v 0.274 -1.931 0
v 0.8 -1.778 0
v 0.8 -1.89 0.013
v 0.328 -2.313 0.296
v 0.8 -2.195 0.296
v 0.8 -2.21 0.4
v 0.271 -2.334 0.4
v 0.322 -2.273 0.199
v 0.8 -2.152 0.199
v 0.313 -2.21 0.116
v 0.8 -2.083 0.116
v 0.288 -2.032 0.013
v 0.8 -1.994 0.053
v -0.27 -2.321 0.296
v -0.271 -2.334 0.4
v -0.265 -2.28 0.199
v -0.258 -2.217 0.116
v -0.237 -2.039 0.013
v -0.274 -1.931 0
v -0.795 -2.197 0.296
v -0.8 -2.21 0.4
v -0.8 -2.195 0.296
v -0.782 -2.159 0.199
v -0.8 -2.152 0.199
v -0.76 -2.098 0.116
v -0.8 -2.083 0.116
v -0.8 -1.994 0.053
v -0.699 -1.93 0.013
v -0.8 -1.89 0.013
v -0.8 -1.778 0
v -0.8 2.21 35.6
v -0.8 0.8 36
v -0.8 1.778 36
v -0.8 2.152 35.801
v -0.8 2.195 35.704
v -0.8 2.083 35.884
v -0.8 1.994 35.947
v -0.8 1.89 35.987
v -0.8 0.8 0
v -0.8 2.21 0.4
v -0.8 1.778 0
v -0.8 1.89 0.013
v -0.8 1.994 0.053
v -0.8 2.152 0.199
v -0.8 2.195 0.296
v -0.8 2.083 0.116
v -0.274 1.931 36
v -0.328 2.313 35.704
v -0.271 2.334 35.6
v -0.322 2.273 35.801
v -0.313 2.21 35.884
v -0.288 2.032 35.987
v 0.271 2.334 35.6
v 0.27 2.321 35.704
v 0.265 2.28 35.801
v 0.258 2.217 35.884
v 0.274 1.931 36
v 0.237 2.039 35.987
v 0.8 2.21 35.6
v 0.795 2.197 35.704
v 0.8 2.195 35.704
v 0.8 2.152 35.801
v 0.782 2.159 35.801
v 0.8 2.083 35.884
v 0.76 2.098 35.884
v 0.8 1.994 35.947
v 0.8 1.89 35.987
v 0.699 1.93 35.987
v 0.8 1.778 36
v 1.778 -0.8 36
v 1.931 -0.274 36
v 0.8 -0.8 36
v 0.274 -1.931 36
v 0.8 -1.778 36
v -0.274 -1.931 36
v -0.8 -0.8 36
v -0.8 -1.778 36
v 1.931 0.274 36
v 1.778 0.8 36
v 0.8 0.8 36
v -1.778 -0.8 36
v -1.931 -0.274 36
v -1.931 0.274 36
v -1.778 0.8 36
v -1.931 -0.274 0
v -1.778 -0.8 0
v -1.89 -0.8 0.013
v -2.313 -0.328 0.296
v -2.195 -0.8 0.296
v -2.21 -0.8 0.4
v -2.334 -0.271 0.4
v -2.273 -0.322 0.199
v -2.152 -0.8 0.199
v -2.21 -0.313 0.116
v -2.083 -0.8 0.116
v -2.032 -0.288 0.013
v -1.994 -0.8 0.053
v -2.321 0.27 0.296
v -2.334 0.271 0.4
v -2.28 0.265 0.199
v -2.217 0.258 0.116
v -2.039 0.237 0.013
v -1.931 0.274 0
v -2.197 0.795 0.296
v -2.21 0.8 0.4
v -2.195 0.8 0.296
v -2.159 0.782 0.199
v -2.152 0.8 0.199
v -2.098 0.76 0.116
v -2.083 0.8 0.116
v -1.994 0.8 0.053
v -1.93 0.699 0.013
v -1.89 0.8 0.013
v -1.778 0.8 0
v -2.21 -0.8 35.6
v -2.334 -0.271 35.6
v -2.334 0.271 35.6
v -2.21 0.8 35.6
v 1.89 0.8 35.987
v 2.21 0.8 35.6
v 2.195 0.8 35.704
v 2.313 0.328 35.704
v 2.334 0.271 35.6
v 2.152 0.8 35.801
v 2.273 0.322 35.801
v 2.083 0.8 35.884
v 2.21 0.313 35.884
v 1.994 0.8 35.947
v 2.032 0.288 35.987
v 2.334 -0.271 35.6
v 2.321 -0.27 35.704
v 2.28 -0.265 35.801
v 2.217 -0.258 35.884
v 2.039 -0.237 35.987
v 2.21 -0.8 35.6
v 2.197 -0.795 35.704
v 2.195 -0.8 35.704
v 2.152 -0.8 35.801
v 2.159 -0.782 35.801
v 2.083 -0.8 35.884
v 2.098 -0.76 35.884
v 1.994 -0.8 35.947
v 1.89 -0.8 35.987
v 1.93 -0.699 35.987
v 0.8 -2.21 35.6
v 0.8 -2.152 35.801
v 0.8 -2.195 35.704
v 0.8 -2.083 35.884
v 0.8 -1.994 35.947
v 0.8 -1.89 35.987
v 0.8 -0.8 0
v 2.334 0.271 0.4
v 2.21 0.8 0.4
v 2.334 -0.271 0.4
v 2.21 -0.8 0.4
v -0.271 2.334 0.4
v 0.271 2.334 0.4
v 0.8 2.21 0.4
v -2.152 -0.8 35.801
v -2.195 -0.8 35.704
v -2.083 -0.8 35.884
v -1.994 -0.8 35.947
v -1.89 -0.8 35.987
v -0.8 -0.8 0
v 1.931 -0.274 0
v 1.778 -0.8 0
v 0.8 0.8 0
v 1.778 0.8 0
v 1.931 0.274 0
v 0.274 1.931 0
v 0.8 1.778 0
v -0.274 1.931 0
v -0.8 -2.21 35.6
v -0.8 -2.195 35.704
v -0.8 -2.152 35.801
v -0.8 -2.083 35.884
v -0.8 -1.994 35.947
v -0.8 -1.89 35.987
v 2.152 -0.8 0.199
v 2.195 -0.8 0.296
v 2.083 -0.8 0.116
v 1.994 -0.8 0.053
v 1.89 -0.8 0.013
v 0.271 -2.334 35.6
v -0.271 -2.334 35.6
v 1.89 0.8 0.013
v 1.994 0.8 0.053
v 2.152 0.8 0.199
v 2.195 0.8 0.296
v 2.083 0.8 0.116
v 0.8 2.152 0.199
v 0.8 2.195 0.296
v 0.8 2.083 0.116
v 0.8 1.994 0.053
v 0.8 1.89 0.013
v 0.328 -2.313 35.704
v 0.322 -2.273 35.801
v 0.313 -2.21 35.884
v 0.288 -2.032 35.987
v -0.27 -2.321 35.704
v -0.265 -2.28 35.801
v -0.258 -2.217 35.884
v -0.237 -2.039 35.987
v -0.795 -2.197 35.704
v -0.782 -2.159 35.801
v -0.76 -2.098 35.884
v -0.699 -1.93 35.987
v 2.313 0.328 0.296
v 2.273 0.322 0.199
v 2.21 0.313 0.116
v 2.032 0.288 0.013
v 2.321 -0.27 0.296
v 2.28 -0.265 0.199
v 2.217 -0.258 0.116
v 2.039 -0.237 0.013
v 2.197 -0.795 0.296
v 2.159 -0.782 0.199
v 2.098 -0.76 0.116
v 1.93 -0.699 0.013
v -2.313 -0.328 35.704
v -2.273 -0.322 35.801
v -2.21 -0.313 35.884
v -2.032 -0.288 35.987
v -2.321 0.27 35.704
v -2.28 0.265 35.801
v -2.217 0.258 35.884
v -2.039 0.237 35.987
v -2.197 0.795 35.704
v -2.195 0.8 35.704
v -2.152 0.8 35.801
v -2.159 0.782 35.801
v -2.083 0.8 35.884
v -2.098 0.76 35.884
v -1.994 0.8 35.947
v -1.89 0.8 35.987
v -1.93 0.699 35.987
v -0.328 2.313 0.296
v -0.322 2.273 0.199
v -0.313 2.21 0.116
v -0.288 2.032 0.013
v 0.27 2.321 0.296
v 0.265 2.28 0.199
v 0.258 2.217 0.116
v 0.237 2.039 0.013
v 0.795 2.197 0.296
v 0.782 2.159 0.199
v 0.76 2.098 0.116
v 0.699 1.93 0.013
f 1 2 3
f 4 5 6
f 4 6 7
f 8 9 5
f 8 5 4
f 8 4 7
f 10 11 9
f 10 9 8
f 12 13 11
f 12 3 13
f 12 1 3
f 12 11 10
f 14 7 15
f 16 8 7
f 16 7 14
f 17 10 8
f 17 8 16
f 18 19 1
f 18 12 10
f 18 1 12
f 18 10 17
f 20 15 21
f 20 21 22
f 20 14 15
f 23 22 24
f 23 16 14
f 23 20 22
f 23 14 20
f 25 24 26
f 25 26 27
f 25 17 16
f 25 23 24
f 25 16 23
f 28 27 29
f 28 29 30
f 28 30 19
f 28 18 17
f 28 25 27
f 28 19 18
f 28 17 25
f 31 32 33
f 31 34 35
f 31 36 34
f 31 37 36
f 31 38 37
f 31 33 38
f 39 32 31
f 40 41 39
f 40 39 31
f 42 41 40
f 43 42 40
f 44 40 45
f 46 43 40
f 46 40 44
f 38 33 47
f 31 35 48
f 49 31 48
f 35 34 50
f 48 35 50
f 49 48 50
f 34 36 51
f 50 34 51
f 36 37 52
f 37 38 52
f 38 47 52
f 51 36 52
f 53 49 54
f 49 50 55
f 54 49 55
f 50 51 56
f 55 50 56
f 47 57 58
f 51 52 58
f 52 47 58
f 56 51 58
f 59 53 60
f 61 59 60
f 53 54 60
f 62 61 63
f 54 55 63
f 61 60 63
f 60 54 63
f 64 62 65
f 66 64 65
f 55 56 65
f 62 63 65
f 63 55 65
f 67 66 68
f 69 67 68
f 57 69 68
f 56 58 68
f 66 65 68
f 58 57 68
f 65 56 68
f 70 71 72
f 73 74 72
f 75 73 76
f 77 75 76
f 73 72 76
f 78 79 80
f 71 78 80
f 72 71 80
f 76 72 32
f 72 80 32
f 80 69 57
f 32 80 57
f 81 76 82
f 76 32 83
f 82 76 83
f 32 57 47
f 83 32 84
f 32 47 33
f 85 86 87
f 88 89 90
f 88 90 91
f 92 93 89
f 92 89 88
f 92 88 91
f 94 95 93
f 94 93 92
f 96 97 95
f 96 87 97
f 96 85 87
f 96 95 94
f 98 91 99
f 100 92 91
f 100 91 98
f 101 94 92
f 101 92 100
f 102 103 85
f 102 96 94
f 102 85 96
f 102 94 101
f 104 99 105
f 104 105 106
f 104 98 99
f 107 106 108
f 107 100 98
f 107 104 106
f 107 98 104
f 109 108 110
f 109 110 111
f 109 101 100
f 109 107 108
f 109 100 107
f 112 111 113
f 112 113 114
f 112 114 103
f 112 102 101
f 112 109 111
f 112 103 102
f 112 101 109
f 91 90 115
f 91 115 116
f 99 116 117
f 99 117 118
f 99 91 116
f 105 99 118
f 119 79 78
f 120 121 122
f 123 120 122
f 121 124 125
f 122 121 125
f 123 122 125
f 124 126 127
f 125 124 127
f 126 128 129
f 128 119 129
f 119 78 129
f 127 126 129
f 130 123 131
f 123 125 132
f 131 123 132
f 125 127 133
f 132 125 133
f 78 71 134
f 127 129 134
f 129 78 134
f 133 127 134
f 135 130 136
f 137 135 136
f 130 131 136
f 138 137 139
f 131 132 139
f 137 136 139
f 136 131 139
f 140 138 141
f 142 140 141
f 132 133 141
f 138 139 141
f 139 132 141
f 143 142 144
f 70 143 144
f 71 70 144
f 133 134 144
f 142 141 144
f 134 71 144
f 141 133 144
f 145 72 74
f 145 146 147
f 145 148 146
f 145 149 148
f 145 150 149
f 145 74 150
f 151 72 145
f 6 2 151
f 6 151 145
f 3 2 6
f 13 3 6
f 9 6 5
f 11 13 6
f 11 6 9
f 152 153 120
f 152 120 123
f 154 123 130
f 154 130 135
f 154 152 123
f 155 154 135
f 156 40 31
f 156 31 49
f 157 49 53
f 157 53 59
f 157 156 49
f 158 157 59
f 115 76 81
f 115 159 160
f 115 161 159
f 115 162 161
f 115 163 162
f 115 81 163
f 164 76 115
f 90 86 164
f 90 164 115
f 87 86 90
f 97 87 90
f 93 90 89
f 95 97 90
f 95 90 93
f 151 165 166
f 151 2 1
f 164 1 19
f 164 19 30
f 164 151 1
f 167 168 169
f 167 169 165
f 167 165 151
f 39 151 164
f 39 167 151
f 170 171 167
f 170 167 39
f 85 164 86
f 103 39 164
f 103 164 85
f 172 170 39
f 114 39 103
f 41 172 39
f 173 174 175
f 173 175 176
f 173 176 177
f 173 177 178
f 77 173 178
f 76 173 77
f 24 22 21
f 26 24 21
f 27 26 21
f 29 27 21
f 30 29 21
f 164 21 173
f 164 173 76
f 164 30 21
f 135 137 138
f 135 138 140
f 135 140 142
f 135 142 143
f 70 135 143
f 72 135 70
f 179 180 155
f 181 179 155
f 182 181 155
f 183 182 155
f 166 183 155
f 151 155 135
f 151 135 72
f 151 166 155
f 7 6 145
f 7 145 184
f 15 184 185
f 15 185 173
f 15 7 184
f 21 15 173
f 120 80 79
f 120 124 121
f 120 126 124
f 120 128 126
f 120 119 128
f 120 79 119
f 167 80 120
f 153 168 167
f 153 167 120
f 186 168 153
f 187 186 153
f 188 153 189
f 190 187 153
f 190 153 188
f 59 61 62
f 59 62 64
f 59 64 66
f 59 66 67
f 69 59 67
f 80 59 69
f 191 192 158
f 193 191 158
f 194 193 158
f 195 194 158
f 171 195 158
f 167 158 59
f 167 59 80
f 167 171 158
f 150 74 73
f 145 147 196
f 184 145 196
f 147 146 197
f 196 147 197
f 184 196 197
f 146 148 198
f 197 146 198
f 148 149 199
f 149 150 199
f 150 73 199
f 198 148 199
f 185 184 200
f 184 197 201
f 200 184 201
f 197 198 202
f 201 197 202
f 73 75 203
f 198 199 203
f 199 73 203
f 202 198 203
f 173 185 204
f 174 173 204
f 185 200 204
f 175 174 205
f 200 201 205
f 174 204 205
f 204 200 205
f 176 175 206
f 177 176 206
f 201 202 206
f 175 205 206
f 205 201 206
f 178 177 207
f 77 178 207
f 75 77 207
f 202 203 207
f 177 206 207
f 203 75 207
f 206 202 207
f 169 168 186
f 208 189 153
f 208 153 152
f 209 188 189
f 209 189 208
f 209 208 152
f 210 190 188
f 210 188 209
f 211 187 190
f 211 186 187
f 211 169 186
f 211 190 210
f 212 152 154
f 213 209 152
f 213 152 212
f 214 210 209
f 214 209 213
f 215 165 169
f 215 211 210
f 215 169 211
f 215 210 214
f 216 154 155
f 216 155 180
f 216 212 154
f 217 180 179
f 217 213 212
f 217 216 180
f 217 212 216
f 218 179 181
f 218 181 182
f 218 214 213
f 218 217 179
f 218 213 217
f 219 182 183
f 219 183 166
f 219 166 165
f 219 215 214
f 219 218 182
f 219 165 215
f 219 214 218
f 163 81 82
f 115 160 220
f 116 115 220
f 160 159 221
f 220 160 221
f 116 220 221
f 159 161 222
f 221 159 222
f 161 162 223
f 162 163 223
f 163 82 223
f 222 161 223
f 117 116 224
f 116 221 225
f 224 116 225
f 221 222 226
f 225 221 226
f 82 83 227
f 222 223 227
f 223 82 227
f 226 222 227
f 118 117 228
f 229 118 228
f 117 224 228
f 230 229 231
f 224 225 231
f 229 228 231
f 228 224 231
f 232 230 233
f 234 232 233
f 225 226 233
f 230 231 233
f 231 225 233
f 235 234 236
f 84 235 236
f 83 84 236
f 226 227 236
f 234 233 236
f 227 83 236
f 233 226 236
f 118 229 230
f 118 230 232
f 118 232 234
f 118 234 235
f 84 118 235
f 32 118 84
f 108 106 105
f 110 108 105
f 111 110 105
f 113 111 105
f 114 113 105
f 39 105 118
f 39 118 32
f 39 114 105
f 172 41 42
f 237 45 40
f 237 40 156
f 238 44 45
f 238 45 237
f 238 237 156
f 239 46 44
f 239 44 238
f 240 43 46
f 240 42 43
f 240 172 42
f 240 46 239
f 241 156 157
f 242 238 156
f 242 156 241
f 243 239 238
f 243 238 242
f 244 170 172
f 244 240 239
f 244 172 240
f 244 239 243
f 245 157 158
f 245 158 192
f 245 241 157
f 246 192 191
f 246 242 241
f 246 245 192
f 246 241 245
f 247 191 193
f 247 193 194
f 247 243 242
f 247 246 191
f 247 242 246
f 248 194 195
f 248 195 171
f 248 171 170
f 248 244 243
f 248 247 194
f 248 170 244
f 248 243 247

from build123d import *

# Parameters (mm, degrees)
SALIENTE_EXTRUIR1_DEPTH = 36
REDONDEO2_R             = 0.4


with BuildPart() as part:
    # Croquis1 → Saliente-Extruir1 (new body)
    with BuildSketch(Plane.XY):
        with BuildLine():
            Line((0.8, 2.209637979), (0.8, 0.8))
            Line((0.8, 0.8), (2.209637979, 0.8))
            ThreePointArc((2.209637979, 0.8), (2.35, 0), (2.209637979, -0.8))
            Line((2.209637979, -0.8), (0.8, -0.8))
            Line((0.8, -0.8), (0.8, -2.209637979))
            ThreePointArc((0.8, -2.209637979), (0, -2.35), (-0.8, -2.209637979))
            Line((-0.8, -2.209637979), (-0.8, -0.8))
            Line((-0.8, -0.8), (-2.209637979, -0.8))
            ThreePointArc((-2.209637979, -0.8), (-2.35, 0), (-2.209637979, 0.8))
            Line((-2.209637979, 0.8), (-0.8, 0.8))
            Line((-0.8, 0.8), (-0.8, 2.209637979))
            ThreePointArc((-0.8, 2.209637979), (0, 2.35), (0.8, 2.209637979))
        make_face()
    extrude(amount=SALIENTE_EXTRUIR1_DEPTH)

    # Redondeo2
    redondeo2_edges = [part.edges().sort_by_distance(p)[0] for p in [
        (2.35, 0, 0),
        (0, -2.35, 0),
        (-2.35, 0, 0),
        (0, 2.35, 0),
        (-2.35, 0, 36),
        (0, -2.35, 36),
        (2.35, 0, 36),
        (0, 2.35, 36),
    ]]
    fillet(redondeo2_edges, radius=REDONDEO2_R)


solid = part.part
